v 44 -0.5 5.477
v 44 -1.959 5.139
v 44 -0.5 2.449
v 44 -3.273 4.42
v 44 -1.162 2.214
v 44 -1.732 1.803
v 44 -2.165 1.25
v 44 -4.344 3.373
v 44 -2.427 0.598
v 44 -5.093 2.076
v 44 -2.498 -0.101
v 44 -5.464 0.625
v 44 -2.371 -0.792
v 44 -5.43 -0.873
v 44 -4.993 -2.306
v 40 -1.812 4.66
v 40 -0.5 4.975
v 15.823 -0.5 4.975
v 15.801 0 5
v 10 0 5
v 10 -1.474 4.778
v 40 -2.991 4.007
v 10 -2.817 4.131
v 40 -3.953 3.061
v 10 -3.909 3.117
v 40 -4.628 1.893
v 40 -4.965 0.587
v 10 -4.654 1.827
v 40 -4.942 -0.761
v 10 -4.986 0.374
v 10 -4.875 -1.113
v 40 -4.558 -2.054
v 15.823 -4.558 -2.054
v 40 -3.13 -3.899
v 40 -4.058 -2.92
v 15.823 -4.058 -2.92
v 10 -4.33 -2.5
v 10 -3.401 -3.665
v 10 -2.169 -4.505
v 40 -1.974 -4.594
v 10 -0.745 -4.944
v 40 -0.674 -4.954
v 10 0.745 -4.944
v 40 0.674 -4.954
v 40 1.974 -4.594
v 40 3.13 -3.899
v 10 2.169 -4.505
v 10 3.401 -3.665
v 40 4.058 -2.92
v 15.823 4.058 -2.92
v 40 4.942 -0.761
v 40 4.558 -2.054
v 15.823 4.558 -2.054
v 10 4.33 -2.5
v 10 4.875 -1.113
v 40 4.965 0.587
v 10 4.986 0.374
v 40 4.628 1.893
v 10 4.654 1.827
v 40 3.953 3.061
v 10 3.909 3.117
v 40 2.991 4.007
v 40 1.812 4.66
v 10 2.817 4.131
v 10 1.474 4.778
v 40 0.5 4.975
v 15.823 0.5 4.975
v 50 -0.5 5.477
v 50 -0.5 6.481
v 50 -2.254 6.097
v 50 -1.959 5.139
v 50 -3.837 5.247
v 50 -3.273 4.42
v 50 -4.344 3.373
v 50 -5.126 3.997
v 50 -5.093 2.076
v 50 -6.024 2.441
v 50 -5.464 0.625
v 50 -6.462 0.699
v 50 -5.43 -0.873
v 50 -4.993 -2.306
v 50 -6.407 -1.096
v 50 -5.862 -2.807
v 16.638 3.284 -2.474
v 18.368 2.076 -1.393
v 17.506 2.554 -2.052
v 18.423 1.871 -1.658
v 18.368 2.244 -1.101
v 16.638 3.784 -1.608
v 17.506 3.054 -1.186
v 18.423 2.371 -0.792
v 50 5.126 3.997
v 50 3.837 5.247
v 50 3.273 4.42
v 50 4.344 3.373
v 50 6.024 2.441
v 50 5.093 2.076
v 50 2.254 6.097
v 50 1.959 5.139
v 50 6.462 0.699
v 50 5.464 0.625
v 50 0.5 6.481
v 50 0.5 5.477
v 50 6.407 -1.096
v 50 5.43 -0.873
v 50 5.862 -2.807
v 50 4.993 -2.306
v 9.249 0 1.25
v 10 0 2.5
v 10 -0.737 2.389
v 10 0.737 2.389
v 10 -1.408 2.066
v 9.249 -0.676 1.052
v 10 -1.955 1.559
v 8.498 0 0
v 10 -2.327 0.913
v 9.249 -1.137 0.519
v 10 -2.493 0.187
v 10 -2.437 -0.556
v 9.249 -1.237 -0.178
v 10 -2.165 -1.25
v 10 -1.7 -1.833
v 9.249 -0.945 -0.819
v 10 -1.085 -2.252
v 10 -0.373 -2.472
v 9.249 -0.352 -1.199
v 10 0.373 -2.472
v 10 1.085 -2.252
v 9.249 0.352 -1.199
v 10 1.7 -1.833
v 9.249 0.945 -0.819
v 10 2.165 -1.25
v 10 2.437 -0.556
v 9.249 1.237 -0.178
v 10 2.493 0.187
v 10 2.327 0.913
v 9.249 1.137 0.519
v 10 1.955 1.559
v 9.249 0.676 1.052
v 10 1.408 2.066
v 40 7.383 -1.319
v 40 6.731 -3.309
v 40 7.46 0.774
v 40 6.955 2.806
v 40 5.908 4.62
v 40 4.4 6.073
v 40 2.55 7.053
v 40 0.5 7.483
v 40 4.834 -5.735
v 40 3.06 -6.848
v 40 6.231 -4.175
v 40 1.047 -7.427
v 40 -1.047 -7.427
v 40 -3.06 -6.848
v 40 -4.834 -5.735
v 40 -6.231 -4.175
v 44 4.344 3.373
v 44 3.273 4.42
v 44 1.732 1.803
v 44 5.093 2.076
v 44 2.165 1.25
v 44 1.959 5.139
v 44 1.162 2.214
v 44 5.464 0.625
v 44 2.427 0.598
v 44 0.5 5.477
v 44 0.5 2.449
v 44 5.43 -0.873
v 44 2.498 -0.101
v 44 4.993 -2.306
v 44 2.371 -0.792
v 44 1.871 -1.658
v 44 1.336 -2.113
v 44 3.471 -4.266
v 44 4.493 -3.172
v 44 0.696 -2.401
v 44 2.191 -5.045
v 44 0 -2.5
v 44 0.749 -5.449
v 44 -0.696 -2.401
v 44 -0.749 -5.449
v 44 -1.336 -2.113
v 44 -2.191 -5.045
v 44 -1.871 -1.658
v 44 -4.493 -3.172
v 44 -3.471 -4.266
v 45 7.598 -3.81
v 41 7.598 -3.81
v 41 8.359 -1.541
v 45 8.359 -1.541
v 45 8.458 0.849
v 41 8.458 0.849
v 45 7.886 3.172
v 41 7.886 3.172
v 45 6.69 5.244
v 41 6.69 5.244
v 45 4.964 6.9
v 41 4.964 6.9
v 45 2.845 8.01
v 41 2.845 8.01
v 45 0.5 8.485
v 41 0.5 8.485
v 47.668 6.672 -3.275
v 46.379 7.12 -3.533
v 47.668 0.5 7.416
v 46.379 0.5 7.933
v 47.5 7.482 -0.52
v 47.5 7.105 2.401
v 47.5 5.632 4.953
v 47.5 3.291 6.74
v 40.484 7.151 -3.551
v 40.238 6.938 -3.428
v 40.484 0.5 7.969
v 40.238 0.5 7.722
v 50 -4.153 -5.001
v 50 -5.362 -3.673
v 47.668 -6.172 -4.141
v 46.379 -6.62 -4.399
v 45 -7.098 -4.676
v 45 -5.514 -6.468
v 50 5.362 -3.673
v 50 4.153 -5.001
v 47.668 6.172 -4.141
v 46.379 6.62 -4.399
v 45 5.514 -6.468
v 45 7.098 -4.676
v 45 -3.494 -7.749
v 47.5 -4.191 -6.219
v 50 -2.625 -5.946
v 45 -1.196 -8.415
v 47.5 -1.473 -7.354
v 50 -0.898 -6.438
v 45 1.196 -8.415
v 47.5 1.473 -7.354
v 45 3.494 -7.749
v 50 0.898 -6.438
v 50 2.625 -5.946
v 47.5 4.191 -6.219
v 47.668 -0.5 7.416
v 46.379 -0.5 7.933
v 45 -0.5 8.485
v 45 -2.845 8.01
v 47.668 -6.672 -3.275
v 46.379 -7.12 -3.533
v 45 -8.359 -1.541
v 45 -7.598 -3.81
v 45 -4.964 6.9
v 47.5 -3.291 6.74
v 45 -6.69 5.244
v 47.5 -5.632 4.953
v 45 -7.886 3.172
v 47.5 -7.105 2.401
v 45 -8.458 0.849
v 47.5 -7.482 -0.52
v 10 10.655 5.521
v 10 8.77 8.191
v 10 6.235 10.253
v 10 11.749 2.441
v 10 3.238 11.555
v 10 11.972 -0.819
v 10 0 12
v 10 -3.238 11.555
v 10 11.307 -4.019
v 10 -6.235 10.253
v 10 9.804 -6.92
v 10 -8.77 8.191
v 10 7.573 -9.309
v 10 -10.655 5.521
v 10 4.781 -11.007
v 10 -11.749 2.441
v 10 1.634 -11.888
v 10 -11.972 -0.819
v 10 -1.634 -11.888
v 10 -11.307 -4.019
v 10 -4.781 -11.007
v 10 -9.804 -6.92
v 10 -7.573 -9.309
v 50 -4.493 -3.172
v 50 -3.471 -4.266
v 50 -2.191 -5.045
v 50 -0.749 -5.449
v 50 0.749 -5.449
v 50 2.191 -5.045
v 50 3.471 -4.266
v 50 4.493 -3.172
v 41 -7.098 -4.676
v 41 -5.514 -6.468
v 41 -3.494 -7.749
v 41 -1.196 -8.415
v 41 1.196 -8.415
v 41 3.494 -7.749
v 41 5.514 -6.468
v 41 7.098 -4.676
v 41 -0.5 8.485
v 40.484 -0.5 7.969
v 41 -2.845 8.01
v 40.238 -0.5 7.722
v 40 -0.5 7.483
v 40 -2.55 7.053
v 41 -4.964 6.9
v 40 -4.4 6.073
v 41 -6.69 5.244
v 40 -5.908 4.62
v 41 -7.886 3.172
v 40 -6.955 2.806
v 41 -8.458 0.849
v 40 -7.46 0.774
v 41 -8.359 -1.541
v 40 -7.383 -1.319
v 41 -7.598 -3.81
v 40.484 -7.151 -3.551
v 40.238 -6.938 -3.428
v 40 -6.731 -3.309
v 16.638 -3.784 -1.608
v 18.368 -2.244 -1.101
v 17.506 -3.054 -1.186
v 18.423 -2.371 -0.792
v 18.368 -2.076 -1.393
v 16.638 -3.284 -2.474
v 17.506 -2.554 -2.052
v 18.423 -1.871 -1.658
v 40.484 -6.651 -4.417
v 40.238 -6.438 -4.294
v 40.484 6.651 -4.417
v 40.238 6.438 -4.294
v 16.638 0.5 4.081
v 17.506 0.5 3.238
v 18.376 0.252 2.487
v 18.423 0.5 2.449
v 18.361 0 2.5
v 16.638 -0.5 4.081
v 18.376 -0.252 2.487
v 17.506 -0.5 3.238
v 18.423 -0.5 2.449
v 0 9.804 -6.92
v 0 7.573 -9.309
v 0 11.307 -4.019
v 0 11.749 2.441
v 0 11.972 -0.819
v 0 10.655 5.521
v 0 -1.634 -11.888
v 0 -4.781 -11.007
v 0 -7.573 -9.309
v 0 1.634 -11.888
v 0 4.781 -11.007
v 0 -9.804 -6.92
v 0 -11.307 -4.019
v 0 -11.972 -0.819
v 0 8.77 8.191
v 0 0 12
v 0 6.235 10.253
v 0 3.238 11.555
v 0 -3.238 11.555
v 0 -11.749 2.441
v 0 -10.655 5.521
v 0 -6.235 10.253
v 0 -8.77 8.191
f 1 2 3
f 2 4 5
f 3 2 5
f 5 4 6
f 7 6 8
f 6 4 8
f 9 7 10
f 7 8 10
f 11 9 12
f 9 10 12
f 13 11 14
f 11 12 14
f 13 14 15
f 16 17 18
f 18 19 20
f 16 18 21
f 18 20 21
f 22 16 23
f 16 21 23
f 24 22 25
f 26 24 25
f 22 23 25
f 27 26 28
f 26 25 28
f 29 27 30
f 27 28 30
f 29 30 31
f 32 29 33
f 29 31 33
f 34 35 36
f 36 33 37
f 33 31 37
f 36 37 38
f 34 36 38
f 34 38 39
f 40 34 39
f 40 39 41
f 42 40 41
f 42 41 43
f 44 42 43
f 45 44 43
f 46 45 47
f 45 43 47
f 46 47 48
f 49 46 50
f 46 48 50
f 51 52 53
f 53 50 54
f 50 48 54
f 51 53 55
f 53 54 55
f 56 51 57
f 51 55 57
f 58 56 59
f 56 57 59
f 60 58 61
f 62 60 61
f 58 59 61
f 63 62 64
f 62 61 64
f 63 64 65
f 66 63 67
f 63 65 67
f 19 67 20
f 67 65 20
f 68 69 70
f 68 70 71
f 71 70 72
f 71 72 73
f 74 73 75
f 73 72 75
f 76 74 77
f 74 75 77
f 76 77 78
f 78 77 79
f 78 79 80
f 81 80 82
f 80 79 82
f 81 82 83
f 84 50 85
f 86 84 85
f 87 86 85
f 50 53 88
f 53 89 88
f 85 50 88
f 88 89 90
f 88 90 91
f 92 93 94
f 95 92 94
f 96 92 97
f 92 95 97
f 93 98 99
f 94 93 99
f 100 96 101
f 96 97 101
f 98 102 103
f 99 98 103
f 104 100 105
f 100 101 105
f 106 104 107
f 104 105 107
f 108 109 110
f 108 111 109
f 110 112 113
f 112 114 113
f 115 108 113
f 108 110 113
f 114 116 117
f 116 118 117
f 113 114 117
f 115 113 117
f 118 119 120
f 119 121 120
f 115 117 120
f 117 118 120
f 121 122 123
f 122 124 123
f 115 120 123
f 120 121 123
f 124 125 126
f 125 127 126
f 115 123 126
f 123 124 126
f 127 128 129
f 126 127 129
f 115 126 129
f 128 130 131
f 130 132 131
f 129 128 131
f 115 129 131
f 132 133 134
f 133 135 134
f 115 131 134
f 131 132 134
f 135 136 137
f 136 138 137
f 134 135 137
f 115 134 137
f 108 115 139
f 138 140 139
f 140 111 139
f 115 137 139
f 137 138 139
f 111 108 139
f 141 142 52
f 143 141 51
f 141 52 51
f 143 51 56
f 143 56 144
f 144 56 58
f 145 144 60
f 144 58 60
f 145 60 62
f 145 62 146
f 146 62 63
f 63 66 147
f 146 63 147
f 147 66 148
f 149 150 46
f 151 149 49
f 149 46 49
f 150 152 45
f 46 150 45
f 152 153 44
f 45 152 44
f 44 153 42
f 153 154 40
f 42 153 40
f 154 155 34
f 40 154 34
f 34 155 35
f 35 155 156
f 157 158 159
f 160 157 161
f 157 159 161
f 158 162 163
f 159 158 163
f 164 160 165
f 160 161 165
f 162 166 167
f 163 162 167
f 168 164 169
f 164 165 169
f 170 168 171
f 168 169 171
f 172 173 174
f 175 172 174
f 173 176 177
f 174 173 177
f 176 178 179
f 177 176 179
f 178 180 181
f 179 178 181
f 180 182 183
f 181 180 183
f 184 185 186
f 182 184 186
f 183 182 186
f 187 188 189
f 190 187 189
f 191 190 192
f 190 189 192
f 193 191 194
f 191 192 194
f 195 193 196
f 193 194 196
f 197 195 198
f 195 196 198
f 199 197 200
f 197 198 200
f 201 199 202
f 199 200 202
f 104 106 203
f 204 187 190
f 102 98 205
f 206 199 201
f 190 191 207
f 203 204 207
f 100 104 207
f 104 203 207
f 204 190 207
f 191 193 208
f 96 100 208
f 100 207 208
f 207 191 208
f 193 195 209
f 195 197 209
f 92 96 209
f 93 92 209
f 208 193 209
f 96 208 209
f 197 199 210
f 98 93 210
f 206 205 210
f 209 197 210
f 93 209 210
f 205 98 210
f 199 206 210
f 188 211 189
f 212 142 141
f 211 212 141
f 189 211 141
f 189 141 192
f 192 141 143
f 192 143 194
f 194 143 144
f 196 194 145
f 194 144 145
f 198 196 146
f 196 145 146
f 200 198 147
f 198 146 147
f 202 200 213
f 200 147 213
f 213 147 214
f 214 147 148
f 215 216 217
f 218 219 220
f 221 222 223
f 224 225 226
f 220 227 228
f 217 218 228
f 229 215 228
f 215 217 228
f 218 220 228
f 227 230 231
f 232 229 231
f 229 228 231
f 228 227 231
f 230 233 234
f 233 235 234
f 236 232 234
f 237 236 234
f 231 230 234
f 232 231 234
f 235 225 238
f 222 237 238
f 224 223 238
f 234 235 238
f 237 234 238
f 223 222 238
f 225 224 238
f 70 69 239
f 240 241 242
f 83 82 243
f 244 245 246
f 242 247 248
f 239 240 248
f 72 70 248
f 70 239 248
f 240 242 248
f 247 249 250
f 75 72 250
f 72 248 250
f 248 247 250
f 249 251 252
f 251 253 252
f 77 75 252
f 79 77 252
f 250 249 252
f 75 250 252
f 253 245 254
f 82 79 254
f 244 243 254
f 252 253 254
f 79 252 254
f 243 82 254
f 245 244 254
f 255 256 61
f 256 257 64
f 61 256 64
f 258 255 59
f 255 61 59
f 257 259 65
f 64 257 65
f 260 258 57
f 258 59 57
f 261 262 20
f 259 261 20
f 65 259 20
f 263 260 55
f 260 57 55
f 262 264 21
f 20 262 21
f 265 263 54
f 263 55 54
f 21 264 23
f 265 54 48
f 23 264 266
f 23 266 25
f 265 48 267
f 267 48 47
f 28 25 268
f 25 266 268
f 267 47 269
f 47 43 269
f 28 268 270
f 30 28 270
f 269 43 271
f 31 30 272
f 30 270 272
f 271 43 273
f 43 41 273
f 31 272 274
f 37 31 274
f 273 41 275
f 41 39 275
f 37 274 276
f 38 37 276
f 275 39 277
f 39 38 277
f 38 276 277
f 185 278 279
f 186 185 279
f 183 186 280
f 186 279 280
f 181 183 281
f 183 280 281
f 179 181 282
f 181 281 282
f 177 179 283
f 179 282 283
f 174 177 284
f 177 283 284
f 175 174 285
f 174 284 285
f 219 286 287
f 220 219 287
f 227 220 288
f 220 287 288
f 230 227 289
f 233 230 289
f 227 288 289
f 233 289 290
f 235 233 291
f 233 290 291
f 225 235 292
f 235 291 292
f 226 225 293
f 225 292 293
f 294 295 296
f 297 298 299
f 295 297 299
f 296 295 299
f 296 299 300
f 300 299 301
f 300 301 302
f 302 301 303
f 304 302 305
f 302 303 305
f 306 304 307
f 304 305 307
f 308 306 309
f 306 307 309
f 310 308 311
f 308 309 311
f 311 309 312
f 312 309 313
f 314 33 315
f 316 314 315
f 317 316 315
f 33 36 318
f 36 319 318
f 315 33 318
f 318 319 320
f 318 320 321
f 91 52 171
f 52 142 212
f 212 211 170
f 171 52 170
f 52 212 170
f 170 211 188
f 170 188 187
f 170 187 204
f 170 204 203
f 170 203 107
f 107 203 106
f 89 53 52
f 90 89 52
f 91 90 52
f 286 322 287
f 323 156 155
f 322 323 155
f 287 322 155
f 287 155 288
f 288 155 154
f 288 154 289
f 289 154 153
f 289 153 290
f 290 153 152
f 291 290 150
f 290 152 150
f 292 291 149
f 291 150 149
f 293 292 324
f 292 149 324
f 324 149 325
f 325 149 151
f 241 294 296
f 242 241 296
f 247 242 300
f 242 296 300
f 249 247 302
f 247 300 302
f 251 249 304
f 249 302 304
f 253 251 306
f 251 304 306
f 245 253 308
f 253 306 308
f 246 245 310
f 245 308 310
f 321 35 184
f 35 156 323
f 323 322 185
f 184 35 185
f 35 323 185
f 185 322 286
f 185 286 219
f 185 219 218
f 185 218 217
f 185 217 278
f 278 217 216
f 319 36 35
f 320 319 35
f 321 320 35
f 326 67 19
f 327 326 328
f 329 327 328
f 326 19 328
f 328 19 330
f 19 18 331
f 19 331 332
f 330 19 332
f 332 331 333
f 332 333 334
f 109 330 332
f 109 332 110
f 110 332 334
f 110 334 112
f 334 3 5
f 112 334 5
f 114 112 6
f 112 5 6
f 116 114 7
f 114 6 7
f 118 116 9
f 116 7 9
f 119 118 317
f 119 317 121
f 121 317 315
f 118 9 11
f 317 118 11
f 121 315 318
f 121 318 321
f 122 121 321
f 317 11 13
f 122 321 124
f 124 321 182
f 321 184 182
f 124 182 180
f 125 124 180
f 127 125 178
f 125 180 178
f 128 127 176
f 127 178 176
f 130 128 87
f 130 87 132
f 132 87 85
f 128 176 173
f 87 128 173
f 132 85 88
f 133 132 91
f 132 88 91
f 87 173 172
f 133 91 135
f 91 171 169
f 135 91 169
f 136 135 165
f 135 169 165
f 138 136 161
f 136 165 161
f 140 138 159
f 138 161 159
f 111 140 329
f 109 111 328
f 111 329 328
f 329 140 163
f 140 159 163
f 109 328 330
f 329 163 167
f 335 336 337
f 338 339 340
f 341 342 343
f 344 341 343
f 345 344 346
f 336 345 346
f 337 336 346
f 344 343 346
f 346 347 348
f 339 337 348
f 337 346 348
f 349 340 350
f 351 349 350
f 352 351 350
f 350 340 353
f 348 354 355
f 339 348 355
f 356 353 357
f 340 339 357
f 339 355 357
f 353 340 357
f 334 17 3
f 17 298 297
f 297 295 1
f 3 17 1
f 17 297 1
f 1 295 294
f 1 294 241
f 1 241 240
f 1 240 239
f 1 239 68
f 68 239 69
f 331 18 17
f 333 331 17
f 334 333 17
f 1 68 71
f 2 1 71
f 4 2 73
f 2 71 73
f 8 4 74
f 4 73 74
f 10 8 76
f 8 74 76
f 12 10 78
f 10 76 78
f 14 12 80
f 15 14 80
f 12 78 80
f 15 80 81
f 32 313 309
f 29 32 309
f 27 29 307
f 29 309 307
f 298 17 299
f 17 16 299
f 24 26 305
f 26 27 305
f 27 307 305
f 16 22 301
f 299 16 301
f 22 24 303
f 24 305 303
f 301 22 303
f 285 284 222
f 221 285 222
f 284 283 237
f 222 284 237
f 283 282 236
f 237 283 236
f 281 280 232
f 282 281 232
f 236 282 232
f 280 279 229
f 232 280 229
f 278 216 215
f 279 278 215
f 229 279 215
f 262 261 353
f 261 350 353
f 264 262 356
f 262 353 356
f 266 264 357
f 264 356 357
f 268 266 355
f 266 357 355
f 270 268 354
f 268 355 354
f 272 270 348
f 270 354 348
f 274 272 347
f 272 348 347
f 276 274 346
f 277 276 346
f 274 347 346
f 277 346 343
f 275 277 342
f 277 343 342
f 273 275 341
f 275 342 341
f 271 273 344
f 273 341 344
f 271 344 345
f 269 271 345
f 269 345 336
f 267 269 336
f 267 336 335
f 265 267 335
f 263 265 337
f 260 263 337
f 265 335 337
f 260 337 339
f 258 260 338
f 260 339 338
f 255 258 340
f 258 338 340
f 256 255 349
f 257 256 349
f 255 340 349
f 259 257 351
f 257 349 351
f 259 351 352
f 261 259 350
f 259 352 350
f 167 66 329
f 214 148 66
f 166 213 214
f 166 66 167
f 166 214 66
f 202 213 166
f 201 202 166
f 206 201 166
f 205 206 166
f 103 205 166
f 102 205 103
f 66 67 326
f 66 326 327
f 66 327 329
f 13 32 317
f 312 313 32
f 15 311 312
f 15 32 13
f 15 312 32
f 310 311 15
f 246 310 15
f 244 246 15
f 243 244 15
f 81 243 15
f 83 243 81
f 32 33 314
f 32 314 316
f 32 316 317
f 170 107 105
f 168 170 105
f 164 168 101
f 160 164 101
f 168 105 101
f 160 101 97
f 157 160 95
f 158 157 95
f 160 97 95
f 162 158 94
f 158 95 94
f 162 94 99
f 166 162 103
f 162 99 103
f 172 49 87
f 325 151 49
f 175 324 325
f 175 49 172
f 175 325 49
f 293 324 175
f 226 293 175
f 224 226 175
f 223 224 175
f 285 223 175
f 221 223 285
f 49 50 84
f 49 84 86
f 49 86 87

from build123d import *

# Parameters (mm, degrees)
F2_SIZE  = 1
F4_DEPTH = 0.5
F5_COUNT = 3


with BuildPart() as f1:
    # F0 (on Front) → F1 (revolve)
    with BuildSketch(Plane.XZ):
        Polygon((40, 5), (10, 5), (10, 12), (0, 12), (0, 0), (8.4978484524, 0), (10, 2.5), (44, 2.5), (44, 5.5), (50, 5.5), (50, 6.5), (45, 8.5), (40, 8.5), align=None)
    revolve(axis=Axis((4.2489242262, 0, 0), (1, 0, 0)))

    # F2
    f2_edges = [f1.edges().sort_by_distance(p)[0] for p in [
        (40, 0, -8.5),
    ]]
    chamfer(f2_edges, length=F2_SIZE)


with BuildPart() as f4:
    # F3 (on Front) → F4 (new body, symmetric)
    with BuildSketch(Plane.XZ):
        with BuildLine():
            Line((56.1913425727, 38), (31, 38))
            ThreePointArc((31, 38), (11, 18), (31, -2))
            Line((31, -2), (56.1913425727, -2))
            Line((56.1913425727, -2), (56.1913425727, 38))
        make_face()
    extrude(amount=F4_DEPTH, both=True)


with BuildPart() as f5_1:
    # F5: instance of F4
    add(f4.part.rotate(Axis((62.4550534707, 0, 0), (1, 0, 0)), 1 * 360 / F5_COUNT))


with BuildPart() as f5_2:
    # F5: instance of F4
    add(f4.part.rotate(Axis((62.4550534707, 0, 0), (1, 0, 0)), 2 * 360 / F5_COUNT))


with BuildPart() as f1_1:
    add(f1.part)

    # F6: cut F4, F5_1, F5_2
    add(f4.part, mode=Mode.SUBTRACT)
    add(f5_1.part, mode=Mode.SUBTRACT)
    add(f5_2.part, mode=Mode.SUBTRACT)


solid = f1_1.part
